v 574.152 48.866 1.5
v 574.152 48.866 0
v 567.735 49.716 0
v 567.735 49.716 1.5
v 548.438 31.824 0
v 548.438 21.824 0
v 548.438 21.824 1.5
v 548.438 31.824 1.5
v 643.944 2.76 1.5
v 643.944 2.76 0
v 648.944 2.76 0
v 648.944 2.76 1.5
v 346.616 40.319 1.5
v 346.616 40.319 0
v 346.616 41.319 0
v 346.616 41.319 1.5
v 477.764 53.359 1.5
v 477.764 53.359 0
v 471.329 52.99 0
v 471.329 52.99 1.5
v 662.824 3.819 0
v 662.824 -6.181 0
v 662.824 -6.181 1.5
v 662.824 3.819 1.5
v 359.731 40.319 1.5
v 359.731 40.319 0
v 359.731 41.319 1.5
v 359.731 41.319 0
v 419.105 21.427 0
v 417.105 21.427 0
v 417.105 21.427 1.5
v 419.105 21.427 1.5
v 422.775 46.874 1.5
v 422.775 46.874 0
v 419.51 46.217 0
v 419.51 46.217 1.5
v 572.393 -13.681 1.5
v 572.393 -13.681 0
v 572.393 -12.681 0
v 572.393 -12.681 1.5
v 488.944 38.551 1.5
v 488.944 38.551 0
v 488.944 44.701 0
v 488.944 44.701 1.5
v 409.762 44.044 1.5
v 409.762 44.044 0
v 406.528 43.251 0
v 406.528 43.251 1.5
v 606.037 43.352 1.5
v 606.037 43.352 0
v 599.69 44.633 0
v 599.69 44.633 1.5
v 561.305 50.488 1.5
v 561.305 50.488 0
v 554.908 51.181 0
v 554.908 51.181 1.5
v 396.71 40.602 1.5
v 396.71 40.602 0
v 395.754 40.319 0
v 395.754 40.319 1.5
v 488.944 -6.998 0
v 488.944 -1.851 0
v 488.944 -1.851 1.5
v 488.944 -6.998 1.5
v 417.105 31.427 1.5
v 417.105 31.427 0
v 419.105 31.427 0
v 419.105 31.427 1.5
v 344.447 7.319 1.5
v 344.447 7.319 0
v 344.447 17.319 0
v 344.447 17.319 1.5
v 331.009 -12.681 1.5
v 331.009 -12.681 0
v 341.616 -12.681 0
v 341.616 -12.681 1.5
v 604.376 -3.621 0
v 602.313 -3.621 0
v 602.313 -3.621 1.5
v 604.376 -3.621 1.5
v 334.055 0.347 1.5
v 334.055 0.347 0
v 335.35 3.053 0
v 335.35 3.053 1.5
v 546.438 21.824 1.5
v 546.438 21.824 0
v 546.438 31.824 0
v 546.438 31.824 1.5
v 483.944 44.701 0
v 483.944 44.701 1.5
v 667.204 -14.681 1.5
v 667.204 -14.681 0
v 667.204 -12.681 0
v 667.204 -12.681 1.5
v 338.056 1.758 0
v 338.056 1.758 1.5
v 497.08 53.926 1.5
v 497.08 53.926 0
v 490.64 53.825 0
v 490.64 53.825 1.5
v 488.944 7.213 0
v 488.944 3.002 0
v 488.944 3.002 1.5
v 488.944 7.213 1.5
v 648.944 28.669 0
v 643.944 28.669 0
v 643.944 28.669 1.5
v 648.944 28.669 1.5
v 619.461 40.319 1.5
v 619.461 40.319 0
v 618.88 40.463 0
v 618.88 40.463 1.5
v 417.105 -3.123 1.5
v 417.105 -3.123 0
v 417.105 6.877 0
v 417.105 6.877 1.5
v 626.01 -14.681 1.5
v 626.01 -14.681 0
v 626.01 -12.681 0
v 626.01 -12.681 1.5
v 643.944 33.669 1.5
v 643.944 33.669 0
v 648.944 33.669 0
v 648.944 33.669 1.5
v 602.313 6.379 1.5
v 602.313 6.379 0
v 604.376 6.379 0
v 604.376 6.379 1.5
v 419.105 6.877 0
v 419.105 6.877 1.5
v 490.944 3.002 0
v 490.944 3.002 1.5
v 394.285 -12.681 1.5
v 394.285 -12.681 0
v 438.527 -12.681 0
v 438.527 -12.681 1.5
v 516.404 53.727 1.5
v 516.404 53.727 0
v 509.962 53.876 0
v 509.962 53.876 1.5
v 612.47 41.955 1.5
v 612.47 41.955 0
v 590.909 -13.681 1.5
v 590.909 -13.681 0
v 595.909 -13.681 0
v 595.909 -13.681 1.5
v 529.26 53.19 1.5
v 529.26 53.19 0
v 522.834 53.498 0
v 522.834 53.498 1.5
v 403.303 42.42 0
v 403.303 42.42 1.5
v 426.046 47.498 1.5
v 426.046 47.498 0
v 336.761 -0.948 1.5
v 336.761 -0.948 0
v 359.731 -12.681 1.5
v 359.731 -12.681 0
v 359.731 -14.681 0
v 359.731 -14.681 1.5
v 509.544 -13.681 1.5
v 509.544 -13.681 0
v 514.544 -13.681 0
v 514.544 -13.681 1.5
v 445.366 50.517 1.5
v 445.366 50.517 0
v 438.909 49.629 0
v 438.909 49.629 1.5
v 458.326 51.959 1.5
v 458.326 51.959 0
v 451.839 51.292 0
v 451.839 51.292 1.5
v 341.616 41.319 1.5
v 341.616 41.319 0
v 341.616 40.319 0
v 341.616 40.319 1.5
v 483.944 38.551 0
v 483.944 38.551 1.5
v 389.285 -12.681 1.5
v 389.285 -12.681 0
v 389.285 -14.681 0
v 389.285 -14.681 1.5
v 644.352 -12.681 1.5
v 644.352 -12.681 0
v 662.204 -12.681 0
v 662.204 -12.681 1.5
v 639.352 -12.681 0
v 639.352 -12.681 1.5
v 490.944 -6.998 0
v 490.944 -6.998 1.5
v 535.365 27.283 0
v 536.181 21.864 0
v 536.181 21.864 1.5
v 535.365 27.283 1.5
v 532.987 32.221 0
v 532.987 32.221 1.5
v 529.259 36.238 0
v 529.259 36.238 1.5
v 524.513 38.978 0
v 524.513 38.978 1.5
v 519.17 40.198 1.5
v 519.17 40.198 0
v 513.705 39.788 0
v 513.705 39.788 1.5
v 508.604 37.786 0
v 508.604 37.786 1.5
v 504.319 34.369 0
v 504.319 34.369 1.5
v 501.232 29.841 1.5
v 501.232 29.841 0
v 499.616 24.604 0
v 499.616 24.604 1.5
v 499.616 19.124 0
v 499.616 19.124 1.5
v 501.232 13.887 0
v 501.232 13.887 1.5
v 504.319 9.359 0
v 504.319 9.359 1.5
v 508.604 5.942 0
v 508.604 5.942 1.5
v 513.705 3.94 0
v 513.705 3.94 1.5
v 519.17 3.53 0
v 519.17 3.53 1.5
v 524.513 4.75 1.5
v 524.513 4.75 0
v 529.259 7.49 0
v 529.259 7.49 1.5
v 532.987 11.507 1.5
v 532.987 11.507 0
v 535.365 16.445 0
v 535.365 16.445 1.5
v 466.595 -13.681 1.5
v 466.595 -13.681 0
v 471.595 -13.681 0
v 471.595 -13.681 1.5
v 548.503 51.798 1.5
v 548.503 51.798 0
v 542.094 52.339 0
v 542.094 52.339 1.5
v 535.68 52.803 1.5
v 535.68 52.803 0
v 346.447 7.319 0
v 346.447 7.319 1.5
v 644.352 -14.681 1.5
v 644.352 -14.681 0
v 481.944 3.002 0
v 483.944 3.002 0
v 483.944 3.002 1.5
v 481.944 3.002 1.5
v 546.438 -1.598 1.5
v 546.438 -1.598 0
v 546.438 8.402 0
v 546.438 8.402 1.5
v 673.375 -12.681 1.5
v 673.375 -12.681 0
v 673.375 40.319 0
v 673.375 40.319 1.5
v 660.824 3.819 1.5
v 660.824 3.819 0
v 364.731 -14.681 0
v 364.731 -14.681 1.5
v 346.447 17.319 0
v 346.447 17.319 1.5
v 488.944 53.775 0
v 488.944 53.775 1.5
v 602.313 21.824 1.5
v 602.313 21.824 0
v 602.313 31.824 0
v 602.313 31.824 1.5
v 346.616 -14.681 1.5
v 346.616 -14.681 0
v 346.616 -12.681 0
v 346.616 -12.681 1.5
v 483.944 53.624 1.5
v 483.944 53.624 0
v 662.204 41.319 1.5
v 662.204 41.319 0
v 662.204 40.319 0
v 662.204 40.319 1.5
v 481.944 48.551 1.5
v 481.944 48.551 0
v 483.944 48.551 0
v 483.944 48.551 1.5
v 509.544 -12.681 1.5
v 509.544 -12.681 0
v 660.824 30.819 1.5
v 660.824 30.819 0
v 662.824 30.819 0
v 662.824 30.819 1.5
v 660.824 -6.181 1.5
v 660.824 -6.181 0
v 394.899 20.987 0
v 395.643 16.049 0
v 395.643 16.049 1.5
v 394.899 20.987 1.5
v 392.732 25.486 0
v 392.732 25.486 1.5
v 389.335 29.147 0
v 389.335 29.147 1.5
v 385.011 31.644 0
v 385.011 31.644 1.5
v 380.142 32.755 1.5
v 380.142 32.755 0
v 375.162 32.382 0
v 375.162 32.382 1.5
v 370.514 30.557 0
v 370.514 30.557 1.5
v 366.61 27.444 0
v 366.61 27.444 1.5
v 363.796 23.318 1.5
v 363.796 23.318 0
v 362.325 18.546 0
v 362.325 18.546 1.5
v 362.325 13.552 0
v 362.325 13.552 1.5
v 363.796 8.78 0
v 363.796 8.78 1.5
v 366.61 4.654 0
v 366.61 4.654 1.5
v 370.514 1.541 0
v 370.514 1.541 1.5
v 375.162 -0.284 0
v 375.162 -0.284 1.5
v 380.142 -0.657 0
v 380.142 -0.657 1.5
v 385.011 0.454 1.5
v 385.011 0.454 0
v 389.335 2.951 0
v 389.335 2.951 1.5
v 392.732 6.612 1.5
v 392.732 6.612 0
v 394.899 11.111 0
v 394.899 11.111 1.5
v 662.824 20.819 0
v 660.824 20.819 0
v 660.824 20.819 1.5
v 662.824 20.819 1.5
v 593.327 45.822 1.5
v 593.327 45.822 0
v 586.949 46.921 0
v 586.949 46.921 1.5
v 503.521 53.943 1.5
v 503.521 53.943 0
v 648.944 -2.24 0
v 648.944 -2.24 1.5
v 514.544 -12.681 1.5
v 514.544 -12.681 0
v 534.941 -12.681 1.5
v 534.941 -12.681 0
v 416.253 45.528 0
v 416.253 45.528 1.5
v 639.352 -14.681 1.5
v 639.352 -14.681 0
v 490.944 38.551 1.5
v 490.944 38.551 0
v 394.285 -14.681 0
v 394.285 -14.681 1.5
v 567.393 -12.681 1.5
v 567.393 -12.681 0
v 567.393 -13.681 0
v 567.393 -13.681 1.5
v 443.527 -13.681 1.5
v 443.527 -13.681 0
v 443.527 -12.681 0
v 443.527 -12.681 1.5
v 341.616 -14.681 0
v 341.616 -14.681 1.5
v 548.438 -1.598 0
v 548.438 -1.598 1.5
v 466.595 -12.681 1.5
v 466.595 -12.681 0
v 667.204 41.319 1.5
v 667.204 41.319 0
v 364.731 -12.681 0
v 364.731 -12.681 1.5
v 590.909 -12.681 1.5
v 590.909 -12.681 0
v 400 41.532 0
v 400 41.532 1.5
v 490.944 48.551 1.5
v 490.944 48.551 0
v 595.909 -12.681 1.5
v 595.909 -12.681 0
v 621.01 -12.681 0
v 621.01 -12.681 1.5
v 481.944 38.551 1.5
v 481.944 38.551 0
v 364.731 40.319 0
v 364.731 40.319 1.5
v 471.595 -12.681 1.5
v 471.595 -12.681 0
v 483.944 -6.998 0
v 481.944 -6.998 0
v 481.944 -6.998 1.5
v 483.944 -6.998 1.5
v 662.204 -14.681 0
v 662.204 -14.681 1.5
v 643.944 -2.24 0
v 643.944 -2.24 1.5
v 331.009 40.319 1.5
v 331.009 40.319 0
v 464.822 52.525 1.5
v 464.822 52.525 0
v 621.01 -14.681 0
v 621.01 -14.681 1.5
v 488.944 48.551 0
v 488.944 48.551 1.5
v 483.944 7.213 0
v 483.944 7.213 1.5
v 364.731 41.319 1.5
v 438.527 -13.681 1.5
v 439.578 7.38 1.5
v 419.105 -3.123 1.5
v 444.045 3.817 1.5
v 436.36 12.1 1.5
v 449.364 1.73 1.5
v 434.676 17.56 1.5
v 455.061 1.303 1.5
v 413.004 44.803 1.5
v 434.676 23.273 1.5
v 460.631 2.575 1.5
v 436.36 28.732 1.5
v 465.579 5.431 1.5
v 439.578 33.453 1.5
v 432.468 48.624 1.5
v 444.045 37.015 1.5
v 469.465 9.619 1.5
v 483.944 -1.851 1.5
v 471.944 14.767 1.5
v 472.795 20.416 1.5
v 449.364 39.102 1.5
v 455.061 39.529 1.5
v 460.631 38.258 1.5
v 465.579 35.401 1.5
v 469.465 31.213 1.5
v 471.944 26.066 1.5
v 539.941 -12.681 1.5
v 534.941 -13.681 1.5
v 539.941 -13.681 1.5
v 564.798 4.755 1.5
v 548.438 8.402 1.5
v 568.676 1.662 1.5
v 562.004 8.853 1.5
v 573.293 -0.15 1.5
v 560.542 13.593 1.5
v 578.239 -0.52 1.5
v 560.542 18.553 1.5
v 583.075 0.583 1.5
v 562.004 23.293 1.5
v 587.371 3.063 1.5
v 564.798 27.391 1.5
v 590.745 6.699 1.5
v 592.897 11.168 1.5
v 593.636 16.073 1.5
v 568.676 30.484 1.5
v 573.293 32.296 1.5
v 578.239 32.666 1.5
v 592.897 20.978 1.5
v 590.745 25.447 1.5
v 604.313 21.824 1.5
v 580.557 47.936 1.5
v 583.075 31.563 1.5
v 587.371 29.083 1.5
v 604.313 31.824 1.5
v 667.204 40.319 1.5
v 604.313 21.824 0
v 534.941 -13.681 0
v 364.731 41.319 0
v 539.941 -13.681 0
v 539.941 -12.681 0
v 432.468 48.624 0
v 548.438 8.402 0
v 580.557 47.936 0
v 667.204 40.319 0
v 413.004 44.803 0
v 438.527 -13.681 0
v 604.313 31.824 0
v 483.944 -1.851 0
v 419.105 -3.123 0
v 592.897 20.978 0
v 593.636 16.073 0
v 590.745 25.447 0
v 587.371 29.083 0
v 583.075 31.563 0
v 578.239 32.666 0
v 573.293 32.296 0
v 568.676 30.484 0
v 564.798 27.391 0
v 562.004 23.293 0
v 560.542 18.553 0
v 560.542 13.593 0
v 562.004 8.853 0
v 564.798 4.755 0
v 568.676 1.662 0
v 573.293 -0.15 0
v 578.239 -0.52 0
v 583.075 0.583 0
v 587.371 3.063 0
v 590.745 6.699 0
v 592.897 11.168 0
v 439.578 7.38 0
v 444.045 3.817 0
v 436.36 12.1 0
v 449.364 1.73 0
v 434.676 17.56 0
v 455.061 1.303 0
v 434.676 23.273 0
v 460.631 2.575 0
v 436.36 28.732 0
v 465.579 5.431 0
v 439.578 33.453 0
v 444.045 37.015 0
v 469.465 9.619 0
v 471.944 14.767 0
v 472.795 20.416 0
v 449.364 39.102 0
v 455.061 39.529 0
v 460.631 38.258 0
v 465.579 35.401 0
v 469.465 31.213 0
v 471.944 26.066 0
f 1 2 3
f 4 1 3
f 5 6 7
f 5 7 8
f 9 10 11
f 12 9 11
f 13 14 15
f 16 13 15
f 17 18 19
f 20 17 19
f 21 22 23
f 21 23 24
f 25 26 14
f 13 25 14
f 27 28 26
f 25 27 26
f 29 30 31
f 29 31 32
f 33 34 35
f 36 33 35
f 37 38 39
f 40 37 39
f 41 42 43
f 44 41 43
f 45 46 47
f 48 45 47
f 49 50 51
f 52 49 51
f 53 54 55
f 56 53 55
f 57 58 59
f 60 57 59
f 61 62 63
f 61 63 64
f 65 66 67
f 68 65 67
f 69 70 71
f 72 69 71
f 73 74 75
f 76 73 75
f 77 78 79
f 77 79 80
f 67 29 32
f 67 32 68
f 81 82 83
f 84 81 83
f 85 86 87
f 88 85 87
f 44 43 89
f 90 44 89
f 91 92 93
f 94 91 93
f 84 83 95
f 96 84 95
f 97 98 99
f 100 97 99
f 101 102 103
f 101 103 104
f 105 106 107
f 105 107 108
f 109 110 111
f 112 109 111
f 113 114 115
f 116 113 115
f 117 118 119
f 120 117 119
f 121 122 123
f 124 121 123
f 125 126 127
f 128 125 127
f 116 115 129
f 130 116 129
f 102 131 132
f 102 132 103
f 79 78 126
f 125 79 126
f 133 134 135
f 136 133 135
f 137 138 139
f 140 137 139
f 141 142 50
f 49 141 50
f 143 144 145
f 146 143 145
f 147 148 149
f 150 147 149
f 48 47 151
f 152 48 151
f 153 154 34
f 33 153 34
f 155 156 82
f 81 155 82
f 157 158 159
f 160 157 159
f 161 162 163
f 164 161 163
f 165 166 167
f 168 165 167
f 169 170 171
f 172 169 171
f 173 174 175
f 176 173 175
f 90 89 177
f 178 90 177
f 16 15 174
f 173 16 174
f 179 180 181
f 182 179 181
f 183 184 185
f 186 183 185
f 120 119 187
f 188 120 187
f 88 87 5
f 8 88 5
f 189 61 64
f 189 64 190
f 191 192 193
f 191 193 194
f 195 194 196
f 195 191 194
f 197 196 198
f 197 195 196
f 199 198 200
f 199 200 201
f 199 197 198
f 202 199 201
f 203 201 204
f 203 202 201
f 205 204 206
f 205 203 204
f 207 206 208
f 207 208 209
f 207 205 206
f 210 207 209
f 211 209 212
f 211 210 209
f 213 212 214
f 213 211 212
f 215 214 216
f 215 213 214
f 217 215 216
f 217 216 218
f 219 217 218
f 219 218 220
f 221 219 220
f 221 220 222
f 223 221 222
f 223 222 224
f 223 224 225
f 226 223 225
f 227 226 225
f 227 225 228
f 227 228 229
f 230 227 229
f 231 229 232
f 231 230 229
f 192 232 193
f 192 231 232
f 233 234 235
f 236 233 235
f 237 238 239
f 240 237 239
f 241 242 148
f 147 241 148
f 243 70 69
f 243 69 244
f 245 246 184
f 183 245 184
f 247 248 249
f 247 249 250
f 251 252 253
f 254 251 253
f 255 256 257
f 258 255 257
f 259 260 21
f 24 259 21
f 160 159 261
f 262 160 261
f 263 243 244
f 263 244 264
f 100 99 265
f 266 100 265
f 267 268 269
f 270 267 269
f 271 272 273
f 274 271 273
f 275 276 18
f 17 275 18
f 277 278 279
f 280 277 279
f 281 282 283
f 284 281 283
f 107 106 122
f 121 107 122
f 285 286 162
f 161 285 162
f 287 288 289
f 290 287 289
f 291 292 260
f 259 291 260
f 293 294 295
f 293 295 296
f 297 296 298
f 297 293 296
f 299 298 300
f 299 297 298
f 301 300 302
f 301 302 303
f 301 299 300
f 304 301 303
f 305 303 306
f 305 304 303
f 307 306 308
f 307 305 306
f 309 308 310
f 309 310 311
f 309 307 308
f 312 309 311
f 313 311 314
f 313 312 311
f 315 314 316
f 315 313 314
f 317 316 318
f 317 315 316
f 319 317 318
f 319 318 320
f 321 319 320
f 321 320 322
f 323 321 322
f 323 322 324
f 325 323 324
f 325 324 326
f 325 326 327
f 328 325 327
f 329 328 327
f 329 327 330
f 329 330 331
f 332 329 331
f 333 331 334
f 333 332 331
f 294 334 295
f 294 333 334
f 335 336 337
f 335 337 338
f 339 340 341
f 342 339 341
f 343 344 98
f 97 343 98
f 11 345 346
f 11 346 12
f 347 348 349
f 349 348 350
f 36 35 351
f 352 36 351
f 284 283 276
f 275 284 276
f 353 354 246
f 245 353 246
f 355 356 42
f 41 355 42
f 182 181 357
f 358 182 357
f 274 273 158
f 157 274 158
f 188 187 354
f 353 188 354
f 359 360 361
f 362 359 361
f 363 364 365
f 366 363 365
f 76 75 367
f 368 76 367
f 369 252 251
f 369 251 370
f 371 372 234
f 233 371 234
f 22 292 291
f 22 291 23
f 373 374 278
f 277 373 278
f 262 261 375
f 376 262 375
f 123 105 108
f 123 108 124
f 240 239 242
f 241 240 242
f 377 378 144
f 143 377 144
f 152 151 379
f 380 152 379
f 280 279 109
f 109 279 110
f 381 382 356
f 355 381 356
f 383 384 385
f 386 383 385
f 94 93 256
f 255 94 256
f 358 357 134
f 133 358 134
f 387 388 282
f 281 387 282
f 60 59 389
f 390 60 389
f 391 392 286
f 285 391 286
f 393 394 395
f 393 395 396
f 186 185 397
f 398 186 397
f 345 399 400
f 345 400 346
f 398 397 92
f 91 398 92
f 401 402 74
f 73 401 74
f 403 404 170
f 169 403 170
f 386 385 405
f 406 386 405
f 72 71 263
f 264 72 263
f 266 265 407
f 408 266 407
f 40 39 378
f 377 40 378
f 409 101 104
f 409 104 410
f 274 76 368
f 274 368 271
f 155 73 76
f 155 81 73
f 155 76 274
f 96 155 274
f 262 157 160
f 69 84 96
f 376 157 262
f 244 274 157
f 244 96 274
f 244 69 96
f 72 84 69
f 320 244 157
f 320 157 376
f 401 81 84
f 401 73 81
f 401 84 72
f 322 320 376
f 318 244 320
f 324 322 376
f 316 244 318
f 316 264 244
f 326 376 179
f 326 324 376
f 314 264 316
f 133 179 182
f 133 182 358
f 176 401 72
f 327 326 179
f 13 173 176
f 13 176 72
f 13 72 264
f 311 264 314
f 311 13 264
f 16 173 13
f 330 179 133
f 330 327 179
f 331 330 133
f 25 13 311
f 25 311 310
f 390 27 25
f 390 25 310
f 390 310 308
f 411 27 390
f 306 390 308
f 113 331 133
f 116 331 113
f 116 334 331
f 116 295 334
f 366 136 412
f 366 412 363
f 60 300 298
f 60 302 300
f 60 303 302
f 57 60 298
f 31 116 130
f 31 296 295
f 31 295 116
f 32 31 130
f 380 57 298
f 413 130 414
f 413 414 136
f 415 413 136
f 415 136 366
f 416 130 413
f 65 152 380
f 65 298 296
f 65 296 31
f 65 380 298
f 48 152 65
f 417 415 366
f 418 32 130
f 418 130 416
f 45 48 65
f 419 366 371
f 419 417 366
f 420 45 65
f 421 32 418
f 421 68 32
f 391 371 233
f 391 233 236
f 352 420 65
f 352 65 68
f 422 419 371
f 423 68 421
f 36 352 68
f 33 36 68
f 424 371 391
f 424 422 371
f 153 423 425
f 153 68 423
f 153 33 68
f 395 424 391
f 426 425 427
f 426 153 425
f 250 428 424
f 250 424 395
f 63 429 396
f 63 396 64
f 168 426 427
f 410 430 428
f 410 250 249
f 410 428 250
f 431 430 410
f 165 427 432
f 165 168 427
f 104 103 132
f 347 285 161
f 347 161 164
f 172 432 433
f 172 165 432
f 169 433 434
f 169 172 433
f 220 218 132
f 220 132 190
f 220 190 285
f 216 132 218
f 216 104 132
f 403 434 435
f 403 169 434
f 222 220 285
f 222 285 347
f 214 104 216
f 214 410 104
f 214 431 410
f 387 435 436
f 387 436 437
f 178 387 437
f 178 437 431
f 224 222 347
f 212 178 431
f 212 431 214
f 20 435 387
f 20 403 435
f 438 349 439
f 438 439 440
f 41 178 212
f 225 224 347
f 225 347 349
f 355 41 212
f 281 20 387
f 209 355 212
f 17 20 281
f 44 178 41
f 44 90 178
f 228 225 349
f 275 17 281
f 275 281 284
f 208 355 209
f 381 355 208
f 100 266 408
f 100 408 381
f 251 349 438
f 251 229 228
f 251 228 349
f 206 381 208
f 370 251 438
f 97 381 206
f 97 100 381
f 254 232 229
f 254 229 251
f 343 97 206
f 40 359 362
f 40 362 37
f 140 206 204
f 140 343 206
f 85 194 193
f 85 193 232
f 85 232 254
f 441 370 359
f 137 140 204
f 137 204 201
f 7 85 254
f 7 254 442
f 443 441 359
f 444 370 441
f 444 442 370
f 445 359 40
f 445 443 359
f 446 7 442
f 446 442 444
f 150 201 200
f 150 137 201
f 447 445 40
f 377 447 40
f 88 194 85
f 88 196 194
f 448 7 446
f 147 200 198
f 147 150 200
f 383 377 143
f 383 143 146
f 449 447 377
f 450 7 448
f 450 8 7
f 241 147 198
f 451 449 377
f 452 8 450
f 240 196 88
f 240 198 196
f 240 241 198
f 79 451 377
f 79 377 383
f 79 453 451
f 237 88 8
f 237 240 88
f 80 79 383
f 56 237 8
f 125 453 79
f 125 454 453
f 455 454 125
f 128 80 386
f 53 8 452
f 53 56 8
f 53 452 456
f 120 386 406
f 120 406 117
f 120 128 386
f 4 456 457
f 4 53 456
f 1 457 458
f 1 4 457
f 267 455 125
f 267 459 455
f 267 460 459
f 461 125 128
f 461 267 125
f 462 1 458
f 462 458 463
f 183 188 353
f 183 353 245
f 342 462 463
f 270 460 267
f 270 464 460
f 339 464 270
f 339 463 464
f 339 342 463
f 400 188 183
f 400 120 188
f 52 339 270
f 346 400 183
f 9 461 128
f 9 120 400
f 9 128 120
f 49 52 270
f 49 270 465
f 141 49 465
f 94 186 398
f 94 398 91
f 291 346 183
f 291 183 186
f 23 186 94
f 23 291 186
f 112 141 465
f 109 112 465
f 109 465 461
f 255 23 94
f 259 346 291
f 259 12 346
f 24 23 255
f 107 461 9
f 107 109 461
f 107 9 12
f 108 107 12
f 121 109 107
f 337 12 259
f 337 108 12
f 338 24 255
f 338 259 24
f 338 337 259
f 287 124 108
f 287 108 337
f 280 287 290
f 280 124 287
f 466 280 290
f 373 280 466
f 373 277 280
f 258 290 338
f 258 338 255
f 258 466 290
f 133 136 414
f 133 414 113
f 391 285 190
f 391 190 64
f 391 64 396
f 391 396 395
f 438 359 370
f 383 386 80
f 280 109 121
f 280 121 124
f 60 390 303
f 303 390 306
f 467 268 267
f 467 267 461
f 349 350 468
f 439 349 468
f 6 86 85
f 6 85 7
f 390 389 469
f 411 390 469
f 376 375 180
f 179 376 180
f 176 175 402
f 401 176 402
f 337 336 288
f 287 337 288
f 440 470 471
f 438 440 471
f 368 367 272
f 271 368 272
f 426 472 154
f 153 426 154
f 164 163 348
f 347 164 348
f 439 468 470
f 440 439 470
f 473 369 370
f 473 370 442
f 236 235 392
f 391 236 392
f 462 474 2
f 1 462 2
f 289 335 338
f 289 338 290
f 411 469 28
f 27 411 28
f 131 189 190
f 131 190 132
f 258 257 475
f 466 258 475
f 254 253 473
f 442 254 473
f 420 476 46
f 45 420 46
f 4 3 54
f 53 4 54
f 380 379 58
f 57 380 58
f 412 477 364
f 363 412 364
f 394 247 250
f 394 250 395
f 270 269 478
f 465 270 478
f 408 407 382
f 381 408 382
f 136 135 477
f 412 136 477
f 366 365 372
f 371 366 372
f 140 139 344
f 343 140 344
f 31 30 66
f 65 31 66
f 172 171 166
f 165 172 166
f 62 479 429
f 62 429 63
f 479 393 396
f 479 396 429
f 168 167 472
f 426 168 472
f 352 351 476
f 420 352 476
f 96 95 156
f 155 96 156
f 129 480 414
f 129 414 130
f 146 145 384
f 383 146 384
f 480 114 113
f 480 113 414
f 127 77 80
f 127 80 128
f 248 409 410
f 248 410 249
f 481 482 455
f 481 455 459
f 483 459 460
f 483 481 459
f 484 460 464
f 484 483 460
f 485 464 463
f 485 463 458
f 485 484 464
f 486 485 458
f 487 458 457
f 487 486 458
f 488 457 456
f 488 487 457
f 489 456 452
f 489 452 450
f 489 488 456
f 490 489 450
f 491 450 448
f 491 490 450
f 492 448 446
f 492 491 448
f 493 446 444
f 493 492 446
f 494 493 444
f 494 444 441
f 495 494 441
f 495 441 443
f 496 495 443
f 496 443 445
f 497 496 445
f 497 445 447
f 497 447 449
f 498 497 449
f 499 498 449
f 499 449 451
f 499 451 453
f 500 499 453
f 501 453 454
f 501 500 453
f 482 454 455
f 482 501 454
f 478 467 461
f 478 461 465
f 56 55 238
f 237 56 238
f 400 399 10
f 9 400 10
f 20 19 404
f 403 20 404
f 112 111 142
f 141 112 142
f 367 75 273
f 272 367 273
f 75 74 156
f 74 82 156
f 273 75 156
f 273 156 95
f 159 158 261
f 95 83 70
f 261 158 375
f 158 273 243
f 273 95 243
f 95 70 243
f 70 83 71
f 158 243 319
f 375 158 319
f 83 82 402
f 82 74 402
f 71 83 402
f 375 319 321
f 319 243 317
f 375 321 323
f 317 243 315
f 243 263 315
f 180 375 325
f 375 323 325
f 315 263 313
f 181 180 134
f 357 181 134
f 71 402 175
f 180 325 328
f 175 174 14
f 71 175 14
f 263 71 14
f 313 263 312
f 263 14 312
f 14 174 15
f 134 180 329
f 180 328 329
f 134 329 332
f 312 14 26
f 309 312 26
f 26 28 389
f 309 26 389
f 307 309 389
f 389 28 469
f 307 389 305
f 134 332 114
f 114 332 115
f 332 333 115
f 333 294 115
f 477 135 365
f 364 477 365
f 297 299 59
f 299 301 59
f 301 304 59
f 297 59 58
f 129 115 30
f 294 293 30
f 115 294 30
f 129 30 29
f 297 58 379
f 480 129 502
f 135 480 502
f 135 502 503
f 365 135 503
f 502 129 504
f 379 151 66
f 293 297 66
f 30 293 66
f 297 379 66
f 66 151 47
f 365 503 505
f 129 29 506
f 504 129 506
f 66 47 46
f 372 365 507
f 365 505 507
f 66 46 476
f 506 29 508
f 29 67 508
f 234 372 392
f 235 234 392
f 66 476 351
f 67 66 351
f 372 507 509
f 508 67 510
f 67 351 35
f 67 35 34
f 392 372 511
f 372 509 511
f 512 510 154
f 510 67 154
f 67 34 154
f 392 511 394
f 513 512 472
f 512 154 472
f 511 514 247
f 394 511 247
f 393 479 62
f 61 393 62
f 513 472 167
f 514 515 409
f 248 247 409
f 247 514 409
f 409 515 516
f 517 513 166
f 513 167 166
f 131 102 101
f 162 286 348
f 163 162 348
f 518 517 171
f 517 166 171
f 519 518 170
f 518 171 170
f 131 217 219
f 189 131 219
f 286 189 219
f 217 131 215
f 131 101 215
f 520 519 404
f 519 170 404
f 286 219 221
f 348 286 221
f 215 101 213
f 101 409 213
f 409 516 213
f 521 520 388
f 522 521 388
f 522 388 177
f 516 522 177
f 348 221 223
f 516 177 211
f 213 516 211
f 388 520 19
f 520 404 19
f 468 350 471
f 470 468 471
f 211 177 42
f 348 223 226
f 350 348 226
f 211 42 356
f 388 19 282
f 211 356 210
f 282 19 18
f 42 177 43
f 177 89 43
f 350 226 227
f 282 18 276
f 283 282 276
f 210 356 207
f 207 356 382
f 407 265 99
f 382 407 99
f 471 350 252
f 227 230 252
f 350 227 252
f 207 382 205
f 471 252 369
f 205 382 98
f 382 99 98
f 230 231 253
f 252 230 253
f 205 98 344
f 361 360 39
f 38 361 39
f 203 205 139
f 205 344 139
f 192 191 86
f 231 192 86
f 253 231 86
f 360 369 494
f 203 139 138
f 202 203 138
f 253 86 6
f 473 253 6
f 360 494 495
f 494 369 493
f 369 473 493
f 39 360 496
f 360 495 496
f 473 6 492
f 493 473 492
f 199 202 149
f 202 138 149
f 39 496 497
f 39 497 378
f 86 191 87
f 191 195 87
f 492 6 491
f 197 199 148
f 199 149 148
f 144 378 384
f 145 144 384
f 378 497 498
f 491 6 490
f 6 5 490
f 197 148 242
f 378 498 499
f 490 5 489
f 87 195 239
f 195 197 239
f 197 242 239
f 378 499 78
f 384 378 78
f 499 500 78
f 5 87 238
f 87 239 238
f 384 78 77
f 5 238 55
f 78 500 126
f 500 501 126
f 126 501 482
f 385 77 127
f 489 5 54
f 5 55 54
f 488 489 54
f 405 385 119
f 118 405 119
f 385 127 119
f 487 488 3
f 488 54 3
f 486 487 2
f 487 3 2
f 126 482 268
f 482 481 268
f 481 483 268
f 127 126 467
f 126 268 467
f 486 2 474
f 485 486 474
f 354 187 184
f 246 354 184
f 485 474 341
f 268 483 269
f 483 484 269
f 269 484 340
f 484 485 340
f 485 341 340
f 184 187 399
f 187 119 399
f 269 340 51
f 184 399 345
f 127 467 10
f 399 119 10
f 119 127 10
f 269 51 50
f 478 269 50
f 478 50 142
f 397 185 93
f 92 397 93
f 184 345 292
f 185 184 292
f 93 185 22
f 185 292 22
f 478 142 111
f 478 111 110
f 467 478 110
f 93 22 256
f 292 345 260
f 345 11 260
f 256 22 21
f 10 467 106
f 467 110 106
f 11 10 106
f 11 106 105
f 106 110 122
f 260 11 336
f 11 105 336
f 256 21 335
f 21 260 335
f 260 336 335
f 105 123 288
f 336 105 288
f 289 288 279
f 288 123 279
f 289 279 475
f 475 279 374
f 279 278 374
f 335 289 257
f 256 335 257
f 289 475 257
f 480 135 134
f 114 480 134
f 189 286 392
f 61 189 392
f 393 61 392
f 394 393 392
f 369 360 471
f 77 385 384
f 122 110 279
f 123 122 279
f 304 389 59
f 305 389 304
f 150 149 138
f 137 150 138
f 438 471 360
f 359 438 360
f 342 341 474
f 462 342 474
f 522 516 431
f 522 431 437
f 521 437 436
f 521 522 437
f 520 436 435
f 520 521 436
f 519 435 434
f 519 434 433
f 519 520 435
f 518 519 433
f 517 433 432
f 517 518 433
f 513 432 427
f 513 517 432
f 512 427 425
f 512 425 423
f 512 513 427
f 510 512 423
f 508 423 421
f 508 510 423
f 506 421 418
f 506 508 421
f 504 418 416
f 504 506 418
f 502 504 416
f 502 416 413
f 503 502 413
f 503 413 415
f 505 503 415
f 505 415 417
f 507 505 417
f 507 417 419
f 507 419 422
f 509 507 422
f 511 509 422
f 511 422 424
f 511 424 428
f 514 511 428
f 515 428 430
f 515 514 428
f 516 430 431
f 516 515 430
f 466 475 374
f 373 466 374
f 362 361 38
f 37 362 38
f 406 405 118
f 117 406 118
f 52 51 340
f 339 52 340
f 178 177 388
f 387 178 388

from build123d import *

# Parameters (mm, degrees)
MODEL_R         = 19.166698656
MODEL_R_2       = 18.385271544
MODEL_R_3       = 16.640009412
MODEL_R_4       = 16.752801617
MODEL_W         = 2
MODEL_H         = 10
MODEL_W_2       = 2.0625
MODEL_W_3       = 5
MODEL_H_2       = 5
EXTRUDE_1_DEPTH = 1.5


with BuildPart() as part:
    # Model → 凸台-拉伸1 (new body)
    with BuildSketch(Plane.XY):
        Polygon((331.008501053, -12.681071835), (341.616416104, -12.681071835), (341.616416104, -14.681071835), (346.616416104, -14.681071835), (346.616416104, -12.681071835), (359.731458438, -12.681071835), (359.731458438, -14.681071835), (364.731458438, -14.681071835), (364.731458438, -12.681071835), (389.285051542, -12.681071835), (389.285051542, -14.681071835), (394.285051542, -14.681071835), (394.285051542, -12.681071835), (438.527315214, -12.681071835), (438.527315214, -13.681071835), (443.527315214, -13.681071835), (443.527315214, -12.681071835), (466.595113664, -12.681071835), (466.595113664, -13.681071835), (471.595113664, -13.681071835), (471.595113664, -12.681071835), (509.543834164, -12.681071835), (509.543834164, -13.681071835), (514.543834164, -13.681071835), (514.543834164, -12.681071835), (534.941100783, -12.681071835), (534.941100783, -13.681071835), (539.941100783, -13.681071835), (539.941100783, -12.681071835), (567.393171936, -12.681071835), (567.393171936, -13.681071835), (572.393171936, -13.681071835), (572.393171936, -12.681071835), (590.909160047, -12.681071835), (590.909160047, -13.681071835), (595.909160047, -13.681071835), (595.909160047, -12.681071835), (621.009616189, -12.681071835), (621.009616189, -14.681071835), (626.009616189, -14.681071835), (626.009616189, -12.681071835), (639.352091775, -12.681071835), (639.352091775, -14.681071835), (644.352091775, -14.681071835), (644.352091775, -12.681071835), (662.203652971, -12.681071835), (662.203652971, -14.681071835), (667.203652971, -14.681071835), (667.203652971, -12.681071835), (673.375169904, -12.681071835), (673.375169904, 40.318928165), (667.203652971, 40.318928165), (667.203652971, 41.318928165), (662.203652971, 41.318928165), (662.203652971, 40.318928165), (619.461197001, 40.318928165), (618.879989346, 40.463263521), (612.469969479, 41.955284735), (606.036780234, 43.352226087), (599.689619006, 44.633304674), (593.327411645, 45.82195159), (586.94928996, 46.921207599), (580.557470145, 47.935980702), (574.151952199, 48.866270901), (567.734908698, 49.715987149), (561.30547145, 50.48817021), (554.907598578, 51.180900831), (548.503413488, 51.797834645), (542.093915228, 52.338928034), (535.680059227, 52.803138329), (529.259803769, 53.18955372), (522.834147903, 53.498130589), (516.404003437, 53.72682722), (509.962377034, 53.875948948), (503.521170035, 53.942974245), (497.0802952, 53.925905013), (490.639752529, 53.824741253), (488.943859674, 53.774868005), (488.943859674, 48.550761193), (490.943859674, 48.550761193), (490.943859674, 38.550761193), (488.943859674, 38.550761193), (488.943859674, 44.701347368), (483.943859674, 44.701347368), (483.943859674, 38.550761193), (481.943859674, 38.550761193), (481.943859674, 48.550761193), (483.943859674, 48.550761193), (483.943859674, 53.624339658), (477.764179108, 53.358922521), (471.328973881, 52.990271357), (464.822470484, 52.524637869), (458.325635443, 51.959487936), (451.839336947, 51.291780793), (445.366397665, 50.51738939), (438.908510356, 49.62923315), (432.467542259, 48.62422769), (426.046316041, 47.498245959), (422.774988305, 46.874345456), (419.510213514, 46.217127406), (416.253034336, 45.527547239), (413.004318963, 44.80256419), (409.762156535, 44.044263594), (406.528457911, 43.250560117), (403.303179471, 42.420454711), (400.000268013, 41.531679768), (396.709598454, 40.602332225), (395.753608128, 40.318928165), (364.731458438, 40.318928165), (364.731458438, 41.318928165), (359.731458438, 41.318928165), (359.731458438, 40.318928165), (346.616416104, 40.318928165), (346.616416104, 41.318928165), (341.616416104, 41.318928165), (341.616416104, 40.318928165), (331.008501053, 40.318928165), align=None)
        with Locations((453.628632303, 20.416282665)):
            Circle(MODEL_R, mode=Mode.SUBTRACT)
        with Locations((517.796175226, 21.864038252)):
            Circle(MODEL_R_2, mode=Mode.SUBTRACT)
        with Locations((576.99591729, 16.073011283)):
            Circle(MODEL_R_3, mode=Mode.SUBTRACT)
        with Locations((378.89019282, 16.048912753)):
            Circle(MODEL_R_4, mode=Mode.SUBTRACT)
        Polygon((334.054616565, 0.346826696), (335.34950157, 3.052981316), (338.055656189, 1.758096311), (336.760771185, -0.948058308), align=None, mode=Mode.SUBTRACT)
        Polygon((488.943859674, 7.212935553), (483.943859674, 7.212935553), (483.943859674, 3.001809248), (481.943859674, 3.001809248), (481.943859674, -6.998190752), (483.943859674, -6.998190752), (483.943859674, -1.850844057), (488.943859674, -1.850844057), (488.943859674, -6.998190752), (490.943859674, -6.998190752), (490.943859674, 3.001809248), (488.943859674, 3.001809248), align=None, mode=Mode.SUBTRACT)
        with Locations((418.104897365, 1.876528165)):
            Rectangle(MODEL_W, MODEL_H, mode=Mode.SUBTRACT)
        with Locations((547.437658193, 3.401778165)):
            Rectangle(MODEL_W, MODEL_H, mode=Mode.SUBTRACT)
        with Locations((603.344317775, 1.378728165)):
            Rectangle(MODEL_W_2, MODEL_H, mode=Mode.SUBTRACT)
        with Locations((345.447391947, 12.318928165)):
            Rectangle(MODEL_W, MODEL_H, mode=Mode.SUBTRACT)
        with Locations((418.104897365, 26.426650996)):
            Rectangle(MODEL_W, MODEL_H, mode=Mode.SUBTRACT)
        with Locations((547.437658193, 26.823552615)):
            Rectangle(MODEL_W, MODEL_H, mode=Mode.SUBTRACT)
        with Locations((603.313067775, 26.823552615)):
            Rectangle(MODEL_W, MODEL_H, mode=Mode.SUBTRACT)
        with Locations((661.824145294, 25.818928165)):
            Rectangle(MODEL_W, MODEL_H, mode=Mode.SUBTRACT)
        with Locations((661.824145294, -1.181071835)):
            Rectangle(MODEL_W, MODEL_H, mode=Mode.SUBTRACT)
        with Locations((646.443859674, 31.16888081)):
            Rectangle(MODEL_W_3, MODEL_H_2, mode=Mode.SUBTRACT)
        with Locations((646.443859674, 0.259792132)):
            Rectangle(MODEL_W_3, MODEL_H_2, mode=Mode.SUBTRACT)
    extrude(amount=EXTRUDE_1_DEPTH)


solid = part.part
